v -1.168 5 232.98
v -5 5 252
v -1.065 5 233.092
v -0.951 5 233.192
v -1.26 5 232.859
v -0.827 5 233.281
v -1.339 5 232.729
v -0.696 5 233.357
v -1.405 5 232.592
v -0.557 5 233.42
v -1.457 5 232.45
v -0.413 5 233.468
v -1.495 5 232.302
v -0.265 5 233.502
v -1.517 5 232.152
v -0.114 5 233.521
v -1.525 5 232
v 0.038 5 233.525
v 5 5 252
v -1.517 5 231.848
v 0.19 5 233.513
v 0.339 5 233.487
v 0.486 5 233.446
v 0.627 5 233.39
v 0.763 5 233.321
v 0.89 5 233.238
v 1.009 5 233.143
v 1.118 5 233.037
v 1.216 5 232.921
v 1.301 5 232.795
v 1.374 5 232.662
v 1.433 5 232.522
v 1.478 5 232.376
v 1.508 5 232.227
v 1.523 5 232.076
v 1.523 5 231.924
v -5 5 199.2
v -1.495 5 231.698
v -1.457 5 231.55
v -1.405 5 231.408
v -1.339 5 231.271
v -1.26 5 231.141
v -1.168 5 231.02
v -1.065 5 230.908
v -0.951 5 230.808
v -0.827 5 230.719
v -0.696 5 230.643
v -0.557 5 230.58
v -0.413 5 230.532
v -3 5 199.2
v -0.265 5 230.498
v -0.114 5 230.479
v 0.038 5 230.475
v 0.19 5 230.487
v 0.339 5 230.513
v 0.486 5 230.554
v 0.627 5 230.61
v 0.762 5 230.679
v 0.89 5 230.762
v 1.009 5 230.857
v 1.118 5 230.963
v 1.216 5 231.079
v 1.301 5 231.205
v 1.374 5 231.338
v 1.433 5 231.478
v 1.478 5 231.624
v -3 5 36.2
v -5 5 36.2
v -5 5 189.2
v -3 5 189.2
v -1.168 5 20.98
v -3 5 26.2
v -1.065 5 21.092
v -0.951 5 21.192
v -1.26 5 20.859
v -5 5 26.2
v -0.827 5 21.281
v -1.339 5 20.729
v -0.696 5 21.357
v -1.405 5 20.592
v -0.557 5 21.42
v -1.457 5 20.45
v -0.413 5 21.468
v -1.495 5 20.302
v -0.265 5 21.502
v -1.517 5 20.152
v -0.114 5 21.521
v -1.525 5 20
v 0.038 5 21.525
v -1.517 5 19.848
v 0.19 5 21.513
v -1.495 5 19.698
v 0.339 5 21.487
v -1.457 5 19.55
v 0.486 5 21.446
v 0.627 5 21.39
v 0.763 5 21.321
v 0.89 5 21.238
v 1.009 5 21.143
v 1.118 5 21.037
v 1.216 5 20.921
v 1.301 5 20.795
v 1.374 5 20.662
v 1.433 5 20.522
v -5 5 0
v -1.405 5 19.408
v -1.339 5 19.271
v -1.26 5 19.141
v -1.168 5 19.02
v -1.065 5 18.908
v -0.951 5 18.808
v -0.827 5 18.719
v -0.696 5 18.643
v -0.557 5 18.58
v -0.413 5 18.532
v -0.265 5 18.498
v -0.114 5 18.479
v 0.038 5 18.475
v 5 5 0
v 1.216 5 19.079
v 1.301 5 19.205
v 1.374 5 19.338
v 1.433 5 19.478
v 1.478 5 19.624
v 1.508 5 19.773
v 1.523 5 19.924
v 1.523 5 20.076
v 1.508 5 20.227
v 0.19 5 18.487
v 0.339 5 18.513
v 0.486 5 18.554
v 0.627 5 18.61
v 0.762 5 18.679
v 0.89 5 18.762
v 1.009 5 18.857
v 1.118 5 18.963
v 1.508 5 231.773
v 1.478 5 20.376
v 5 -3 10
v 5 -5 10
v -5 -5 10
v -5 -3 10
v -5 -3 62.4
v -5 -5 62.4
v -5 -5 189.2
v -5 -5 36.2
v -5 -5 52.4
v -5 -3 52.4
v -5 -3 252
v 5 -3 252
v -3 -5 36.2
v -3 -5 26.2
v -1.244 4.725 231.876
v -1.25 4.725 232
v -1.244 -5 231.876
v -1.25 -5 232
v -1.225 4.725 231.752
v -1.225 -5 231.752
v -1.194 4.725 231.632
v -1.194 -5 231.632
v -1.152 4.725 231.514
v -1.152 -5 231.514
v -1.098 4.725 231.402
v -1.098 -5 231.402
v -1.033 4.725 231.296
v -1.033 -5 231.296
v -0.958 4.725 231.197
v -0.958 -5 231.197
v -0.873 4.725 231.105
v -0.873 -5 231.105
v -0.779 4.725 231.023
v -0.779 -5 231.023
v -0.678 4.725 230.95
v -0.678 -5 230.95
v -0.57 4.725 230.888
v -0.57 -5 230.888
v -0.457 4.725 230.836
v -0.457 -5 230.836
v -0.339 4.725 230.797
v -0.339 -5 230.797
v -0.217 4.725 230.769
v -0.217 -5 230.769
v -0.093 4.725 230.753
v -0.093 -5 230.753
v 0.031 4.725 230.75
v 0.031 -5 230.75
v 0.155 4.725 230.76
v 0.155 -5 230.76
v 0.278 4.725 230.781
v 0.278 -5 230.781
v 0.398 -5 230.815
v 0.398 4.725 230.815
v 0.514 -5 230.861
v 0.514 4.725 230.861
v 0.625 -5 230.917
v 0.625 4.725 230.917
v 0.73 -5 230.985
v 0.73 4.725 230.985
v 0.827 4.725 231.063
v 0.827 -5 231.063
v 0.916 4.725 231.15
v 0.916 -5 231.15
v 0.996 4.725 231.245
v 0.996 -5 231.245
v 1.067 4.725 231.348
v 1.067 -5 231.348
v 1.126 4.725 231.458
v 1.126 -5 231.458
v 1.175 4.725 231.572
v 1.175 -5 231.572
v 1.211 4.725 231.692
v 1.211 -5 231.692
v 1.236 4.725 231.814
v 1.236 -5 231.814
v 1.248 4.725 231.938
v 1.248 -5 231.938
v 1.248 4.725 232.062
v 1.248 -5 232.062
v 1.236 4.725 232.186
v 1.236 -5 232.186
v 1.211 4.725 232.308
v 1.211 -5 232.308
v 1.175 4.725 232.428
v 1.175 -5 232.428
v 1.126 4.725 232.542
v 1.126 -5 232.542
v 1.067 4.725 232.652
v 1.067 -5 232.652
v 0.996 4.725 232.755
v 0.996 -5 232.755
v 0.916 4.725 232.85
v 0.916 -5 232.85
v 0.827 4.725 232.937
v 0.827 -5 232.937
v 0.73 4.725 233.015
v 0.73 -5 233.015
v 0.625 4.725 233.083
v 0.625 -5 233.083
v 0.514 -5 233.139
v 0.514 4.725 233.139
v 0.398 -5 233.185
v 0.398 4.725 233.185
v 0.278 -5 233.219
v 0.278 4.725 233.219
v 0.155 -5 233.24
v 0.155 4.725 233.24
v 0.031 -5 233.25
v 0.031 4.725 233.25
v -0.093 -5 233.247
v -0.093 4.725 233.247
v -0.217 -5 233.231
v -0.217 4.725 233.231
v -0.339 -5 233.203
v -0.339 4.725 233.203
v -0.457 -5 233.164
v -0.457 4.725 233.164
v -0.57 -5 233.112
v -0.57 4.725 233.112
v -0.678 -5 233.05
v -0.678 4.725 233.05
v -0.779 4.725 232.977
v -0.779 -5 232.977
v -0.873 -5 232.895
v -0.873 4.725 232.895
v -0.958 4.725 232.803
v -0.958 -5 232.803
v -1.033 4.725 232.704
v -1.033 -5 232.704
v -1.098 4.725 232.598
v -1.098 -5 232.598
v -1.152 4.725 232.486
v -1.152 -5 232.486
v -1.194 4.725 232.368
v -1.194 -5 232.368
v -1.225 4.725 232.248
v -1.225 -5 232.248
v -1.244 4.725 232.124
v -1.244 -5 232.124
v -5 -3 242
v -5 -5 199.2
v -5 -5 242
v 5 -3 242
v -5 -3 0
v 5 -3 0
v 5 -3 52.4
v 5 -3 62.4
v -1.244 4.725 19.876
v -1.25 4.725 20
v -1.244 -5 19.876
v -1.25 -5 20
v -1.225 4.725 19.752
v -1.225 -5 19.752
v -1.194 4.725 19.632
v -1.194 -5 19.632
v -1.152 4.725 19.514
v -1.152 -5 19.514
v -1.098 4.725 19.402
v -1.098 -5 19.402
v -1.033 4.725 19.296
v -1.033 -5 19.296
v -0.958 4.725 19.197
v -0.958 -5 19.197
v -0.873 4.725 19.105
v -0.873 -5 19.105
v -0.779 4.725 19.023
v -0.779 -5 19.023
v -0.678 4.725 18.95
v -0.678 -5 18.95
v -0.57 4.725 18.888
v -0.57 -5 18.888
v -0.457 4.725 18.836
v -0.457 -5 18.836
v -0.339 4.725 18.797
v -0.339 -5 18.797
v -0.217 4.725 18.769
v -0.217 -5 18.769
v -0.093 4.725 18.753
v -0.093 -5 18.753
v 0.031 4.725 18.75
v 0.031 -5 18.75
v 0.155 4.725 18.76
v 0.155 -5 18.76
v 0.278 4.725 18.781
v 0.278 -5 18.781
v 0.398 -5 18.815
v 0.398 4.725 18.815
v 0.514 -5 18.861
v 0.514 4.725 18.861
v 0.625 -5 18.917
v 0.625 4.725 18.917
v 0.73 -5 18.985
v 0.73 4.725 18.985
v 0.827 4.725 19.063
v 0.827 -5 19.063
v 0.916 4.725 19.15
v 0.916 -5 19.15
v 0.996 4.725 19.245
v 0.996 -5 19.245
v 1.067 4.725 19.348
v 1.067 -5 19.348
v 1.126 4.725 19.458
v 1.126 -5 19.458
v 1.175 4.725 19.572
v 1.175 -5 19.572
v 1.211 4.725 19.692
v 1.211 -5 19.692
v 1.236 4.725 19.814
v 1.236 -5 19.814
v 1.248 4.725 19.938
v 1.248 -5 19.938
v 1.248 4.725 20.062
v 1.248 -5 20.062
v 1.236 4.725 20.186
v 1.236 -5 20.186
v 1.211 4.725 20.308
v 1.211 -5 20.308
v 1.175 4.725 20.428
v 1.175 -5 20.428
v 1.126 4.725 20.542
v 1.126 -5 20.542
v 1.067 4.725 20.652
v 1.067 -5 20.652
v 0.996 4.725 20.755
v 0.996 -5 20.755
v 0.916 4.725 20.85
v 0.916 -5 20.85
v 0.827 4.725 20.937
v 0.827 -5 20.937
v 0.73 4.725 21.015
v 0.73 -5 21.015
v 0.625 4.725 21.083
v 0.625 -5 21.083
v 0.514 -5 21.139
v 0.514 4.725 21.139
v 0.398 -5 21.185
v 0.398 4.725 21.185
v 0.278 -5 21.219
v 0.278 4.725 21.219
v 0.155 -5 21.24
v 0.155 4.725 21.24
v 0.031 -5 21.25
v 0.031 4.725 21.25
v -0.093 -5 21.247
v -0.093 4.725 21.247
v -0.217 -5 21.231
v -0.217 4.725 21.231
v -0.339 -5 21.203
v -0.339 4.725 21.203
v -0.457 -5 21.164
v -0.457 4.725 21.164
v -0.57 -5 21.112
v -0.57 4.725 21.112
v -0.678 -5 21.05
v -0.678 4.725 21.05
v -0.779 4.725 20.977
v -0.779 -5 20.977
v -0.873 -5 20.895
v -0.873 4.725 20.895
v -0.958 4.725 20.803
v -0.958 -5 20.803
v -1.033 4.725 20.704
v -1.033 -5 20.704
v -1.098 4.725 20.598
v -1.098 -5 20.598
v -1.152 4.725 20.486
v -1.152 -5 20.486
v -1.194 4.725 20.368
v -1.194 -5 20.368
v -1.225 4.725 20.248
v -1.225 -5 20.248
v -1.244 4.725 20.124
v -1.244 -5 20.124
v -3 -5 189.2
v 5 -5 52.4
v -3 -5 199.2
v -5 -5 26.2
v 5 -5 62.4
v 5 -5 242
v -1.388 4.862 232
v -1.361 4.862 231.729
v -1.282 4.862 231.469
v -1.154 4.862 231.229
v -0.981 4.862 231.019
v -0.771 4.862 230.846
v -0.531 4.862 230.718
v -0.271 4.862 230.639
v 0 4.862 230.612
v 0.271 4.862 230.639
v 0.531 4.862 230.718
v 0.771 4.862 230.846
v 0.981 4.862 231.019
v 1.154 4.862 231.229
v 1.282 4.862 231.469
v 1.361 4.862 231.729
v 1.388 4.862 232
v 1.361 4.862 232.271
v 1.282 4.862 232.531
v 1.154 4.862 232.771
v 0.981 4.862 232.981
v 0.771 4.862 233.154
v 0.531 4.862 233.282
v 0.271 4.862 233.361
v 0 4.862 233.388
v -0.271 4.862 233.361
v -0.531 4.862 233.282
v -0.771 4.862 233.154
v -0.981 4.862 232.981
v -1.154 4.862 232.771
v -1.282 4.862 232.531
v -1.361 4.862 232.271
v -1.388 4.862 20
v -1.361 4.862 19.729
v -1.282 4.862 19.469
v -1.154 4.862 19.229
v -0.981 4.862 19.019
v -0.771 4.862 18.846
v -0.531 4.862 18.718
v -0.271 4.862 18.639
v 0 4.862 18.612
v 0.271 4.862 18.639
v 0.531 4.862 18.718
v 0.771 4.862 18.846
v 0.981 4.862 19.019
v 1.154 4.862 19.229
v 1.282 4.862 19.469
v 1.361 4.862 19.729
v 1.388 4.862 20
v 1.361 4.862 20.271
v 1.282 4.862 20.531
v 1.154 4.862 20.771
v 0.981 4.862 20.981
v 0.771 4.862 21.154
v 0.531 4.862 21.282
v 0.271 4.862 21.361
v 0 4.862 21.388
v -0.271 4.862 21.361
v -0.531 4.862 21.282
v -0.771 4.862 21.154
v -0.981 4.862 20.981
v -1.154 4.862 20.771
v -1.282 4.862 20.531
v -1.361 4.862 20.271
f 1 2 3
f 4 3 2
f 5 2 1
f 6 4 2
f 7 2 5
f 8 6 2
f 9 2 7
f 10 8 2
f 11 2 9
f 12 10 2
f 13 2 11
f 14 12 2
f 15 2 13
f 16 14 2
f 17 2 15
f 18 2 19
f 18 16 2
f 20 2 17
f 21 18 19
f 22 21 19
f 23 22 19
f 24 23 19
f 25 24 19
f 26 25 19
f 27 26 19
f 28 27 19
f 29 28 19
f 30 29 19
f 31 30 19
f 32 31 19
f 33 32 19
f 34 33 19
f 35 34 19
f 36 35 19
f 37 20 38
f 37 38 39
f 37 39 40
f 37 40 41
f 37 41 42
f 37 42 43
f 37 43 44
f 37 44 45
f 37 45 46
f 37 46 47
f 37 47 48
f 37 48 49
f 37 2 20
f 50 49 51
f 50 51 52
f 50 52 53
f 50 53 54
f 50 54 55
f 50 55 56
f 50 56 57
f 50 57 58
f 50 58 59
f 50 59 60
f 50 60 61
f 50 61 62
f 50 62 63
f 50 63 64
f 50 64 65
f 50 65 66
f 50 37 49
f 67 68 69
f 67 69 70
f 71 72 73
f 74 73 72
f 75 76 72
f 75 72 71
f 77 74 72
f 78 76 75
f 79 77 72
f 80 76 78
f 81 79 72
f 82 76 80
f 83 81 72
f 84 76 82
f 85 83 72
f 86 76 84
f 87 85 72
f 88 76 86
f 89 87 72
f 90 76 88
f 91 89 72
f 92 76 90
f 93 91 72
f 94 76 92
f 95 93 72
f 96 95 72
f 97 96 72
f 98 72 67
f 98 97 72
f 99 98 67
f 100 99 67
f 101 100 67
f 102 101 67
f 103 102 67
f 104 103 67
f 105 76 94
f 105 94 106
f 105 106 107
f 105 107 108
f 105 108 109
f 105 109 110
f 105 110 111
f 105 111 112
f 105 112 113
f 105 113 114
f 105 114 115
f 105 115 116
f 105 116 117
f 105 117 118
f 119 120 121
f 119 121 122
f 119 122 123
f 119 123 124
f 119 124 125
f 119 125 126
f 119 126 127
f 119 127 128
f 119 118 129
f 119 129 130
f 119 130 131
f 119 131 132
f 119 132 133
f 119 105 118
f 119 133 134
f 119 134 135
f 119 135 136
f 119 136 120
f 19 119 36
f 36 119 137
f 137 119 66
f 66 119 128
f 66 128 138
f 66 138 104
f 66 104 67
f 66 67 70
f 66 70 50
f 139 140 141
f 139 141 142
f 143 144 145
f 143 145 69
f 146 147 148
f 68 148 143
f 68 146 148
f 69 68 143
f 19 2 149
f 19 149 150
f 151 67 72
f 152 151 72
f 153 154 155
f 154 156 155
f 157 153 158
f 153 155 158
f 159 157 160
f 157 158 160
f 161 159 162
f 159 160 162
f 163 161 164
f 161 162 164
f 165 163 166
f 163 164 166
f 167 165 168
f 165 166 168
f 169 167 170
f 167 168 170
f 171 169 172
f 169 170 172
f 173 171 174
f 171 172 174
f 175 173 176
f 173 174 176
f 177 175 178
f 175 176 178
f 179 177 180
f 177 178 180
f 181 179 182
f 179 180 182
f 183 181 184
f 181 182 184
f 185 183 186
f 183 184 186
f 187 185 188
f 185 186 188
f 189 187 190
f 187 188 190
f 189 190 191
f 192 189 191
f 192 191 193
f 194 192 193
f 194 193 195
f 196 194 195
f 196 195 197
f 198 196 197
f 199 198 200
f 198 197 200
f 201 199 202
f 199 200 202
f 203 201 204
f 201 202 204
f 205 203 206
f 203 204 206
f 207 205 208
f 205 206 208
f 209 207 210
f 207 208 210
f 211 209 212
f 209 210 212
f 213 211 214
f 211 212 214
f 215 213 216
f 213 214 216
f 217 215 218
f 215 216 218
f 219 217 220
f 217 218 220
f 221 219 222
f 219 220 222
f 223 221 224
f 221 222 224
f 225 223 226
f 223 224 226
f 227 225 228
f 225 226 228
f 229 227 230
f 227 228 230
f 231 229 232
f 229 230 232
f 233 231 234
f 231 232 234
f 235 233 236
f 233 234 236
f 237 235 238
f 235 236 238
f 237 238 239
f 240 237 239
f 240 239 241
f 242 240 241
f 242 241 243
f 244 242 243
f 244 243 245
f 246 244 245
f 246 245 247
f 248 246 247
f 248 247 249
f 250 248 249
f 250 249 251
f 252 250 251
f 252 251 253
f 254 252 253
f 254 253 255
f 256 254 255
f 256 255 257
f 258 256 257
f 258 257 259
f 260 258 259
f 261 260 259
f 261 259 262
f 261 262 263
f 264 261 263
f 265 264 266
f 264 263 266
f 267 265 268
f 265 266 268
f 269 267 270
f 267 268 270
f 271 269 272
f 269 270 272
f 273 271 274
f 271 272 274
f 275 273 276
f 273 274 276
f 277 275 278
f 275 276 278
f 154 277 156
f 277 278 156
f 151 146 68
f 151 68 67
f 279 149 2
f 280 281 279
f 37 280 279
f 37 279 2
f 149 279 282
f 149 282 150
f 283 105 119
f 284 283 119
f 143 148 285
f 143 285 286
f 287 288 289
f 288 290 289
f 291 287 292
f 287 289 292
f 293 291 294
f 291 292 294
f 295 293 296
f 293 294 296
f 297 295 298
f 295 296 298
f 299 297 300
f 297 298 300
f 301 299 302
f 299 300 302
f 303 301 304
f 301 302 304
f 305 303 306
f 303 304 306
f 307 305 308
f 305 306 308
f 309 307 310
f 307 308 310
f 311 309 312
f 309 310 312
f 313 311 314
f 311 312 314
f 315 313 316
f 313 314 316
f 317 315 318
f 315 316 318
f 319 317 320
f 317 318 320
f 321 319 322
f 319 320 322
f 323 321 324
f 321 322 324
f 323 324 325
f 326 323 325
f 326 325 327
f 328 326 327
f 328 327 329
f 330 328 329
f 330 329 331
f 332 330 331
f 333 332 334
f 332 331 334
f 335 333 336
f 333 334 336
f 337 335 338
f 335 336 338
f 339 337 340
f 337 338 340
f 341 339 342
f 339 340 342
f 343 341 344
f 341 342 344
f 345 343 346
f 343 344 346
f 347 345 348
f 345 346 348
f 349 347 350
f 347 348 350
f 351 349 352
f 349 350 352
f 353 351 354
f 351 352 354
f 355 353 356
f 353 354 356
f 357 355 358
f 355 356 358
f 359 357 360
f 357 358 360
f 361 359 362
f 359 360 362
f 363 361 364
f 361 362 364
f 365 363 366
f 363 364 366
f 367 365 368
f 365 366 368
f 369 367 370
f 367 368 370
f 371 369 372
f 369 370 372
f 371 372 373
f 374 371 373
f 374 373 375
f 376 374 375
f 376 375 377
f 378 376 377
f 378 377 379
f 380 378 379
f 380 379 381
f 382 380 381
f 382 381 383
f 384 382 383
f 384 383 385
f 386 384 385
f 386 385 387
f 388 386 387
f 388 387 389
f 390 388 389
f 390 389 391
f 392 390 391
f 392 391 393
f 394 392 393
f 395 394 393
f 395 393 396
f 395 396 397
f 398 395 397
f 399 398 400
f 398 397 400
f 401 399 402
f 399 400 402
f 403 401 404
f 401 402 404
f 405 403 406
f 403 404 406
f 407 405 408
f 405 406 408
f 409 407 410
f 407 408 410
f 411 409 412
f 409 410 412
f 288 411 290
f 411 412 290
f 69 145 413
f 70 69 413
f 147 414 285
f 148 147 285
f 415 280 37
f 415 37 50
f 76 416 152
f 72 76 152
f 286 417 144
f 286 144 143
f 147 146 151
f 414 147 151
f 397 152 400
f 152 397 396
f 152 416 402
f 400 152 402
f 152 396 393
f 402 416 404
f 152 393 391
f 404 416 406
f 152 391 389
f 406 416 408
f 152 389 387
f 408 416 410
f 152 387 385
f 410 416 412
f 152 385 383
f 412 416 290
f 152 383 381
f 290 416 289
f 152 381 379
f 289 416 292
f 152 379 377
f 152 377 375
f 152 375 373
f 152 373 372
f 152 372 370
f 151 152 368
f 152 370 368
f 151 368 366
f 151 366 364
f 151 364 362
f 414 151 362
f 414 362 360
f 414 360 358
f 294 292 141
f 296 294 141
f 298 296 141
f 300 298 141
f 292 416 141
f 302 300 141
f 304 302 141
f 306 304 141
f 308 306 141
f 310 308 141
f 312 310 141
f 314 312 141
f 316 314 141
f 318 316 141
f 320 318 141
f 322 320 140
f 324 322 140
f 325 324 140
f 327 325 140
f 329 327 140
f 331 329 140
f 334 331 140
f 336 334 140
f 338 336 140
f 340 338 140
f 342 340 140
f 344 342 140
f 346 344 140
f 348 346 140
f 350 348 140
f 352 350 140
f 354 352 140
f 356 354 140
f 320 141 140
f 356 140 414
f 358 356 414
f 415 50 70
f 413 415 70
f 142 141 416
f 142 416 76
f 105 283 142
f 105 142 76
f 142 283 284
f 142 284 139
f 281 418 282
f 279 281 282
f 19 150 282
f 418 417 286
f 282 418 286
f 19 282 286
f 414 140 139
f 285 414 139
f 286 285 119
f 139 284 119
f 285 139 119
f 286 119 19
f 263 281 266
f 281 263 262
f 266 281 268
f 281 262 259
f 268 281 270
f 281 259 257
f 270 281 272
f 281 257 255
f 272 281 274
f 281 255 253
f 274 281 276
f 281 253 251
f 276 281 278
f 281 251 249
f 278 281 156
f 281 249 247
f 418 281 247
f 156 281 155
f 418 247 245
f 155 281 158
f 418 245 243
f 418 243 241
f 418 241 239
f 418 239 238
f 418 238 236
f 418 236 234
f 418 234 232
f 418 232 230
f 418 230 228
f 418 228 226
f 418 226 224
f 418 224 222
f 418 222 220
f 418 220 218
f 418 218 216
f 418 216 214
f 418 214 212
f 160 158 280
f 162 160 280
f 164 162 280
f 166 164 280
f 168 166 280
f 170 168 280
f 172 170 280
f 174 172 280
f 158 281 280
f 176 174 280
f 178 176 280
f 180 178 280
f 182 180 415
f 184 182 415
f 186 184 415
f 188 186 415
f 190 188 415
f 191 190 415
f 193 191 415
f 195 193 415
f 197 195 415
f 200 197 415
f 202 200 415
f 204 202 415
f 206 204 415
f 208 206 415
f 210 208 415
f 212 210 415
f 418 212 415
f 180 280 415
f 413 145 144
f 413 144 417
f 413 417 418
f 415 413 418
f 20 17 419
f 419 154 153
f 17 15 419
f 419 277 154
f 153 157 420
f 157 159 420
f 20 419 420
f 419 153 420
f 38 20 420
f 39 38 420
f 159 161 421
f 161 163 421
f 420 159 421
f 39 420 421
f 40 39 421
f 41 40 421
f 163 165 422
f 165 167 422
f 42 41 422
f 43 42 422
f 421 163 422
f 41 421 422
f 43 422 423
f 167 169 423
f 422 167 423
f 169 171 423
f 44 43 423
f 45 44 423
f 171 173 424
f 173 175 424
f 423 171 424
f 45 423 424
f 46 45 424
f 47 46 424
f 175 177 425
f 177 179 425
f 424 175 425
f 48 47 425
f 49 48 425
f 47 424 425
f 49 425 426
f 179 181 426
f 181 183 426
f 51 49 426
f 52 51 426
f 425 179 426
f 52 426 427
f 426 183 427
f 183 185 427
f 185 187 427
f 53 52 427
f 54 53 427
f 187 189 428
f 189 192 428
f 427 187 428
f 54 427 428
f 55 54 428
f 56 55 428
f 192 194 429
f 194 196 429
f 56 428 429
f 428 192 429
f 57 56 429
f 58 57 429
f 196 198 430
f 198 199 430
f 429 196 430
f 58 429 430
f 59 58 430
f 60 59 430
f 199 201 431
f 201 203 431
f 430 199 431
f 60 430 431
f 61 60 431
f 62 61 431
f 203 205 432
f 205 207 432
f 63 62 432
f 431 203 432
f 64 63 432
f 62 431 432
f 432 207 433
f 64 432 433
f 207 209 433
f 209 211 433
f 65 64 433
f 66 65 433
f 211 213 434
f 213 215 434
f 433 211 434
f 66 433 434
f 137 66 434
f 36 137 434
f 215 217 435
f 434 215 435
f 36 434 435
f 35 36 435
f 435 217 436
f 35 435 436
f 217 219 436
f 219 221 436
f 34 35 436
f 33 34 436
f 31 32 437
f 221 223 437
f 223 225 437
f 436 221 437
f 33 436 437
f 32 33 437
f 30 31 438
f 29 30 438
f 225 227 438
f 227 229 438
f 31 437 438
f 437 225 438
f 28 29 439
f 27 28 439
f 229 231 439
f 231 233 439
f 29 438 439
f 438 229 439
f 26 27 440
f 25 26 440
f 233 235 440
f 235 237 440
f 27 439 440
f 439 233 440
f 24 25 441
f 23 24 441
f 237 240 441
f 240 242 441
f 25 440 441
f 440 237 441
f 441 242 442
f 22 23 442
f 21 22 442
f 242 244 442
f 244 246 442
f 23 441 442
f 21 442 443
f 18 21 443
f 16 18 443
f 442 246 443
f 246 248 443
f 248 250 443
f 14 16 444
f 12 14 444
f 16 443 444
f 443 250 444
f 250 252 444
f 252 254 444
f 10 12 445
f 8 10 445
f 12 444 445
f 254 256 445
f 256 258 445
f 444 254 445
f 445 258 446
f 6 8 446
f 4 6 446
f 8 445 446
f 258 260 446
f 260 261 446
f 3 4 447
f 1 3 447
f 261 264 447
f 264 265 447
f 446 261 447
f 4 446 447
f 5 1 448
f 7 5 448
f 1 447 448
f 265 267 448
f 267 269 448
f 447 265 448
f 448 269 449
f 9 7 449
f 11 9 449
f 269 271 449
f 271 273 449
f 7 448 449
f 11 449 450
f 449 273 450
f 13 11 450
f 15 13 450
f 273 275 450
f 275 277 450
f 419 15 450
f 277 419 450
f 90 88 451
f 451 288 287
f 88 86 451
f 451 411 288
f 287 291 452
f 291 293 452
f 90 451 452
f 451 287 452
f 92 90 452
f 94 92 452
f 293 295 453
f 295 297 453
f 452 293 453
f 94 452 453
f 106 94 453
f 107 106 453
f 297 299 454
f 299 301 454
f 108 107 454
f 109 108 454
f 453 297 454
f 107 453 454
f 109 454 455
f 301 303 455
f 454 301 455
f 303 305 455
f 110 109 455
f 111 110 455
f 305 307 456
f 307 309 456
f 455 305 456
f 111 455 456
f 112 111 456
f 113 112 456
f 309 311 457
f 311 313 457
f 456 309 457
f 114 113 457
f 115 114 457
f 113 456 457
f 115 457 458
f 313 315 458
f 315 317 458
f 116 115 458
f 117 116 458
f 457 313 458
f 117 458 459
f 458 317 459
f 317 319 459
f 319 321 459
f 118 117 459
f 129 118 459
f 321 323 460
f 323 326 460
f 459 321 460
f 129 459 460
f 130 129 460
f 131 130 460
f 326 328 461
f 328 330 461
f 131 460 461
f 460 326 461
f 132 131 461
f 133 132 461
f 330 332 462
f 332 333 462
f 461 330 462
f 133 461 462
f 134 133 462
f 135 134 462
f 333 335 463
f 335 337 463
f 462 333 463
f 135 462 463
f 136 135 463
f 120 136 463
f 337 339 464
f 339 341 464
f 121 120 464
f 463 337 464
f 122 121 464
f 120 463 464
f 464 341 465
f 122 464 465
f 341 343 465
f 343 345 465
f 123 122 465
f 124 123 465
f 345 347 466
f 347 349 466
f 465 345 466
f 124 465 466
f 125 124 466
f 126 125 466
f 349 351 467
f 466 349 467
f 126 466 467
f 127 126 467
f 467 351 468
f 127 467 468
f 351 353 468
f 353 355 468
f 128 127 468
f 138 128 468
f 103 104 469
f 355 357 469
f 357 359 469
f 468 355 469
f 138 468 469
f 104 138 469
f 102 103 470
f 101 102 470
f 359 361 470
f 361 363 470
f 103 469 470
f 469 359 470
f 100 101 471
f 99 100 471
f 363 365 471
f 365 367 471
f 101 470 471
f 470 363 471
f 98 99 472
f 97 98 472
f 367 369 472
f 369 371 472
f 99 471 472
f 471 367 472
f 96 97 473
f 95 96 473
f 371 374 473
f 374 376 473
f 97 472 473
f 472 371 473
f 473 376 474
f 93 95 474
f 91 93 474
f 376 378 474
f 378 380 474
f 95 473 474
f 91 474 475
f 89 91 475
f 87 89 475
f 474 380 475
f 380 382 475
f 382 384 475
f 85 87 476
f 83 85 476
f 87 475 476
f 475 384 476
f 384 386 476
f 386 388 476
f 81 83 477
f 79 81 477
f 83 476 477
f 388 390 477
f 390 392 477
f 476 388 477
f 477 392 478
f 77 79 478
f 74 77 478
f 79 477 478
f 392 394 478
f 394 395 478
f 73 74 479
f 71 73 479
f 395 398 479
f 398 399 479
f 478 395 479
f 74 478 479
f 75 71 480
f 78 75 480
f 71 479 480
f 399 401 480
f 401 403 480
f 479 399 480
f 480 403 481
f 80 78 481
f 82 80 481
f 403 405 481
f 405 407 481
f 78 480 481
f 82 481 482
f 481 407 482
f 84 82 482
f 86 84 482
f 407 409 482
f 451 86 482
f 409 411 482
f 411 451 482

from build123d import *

# Parameters (mm, degrees)
ESQUISSE1_W                     = 10
ESQUISSE1_H                     = 10
BOSS_EXTRU_1_DEPTH              = 252
ESQUISSE2_W                     = 10
ESQUISSE2_H                     = 2
ENL_V_MAT_EXTRU_1_DEPTH         = 11
ESQUISSE5_W                     = 2
ESQUISSE5_H                     = 10
ENL_V_MAT_EXTRU_4_DEPTH         = 11
TROU_TARAUD_M3X0_51_D           = 2.5
TROU_TARAUD_M3X0_51_CSINK_D     = 3.05
TROU_TARAUD_M3X0_51_CSINK_ANGLE = 90


with BuildPart() as part:
    # Esquisse1 → Boss.-Extru.1 (new body)
    with BuildSketch(Plane.XY):
        Rectangle(ESQUISSE1_W, ESQUISSE1_H)
    extrude(amount=BOSS_EXTRU_1_DEPTH)

    # Esquisse2 → Enlèv. mat.-Extru.1 (cut, through all)
    with BuildSketch(Plane.ZY.offset(5)):
        with Locations((5, -4)):
            Rectangle(ESQUISSE2_W, ESQUISSE2_H)
        with Locations((57.4, -4)):
            Rectangle(ESQUISSE2_W, ESQUISSE2_H)
        with Locations((247, -4)):
            Rectangle(ESQUISSE2_W, ESQUISSE2_H)
    extrude(amount=-ENL_V_MAT_EXTRU_1_DEPTH, mode=Mode.SUBTRACT)

    # Esquisse5 → Enlèv. mat.-Extru.4 (cut, through all)
    with BuildSketch(Plane(origin=(0, 5, 0), x_dir=(1, 0, 0), z_dir=(0, 1, 0))):
        with Locations((-4, -194.2)):
            Rectangle(ESQUISSE5_W, ESQUISSE5_H)
        with Locations((-4, -31.2)):
            Rectangle(ESQUISSE5_W, ESQUISSE5_H)
    extrude(amount=-ENL_V_MAT_EXTRU_4_DEPTH, mode=Mode.SUBTRACT)

    # Trou taraudé M3x0.51 (through all)
    with Locations(Plane(origin=(0, 5, 0), x_dir=(1, 0, 0), z_dir=(0, 1, 0))):
        with Locations((0, -20), (0, -232)):
            CounterSinkHole(TROU_TARAUD_M3X0_51_D / 2, TROU_TARAUD_M3X0_51_CSINK_D / 2, counter_sink_angle=TROU_TARAUD_M3X0_51_CSINK_ANGLE)


solid = part.part
